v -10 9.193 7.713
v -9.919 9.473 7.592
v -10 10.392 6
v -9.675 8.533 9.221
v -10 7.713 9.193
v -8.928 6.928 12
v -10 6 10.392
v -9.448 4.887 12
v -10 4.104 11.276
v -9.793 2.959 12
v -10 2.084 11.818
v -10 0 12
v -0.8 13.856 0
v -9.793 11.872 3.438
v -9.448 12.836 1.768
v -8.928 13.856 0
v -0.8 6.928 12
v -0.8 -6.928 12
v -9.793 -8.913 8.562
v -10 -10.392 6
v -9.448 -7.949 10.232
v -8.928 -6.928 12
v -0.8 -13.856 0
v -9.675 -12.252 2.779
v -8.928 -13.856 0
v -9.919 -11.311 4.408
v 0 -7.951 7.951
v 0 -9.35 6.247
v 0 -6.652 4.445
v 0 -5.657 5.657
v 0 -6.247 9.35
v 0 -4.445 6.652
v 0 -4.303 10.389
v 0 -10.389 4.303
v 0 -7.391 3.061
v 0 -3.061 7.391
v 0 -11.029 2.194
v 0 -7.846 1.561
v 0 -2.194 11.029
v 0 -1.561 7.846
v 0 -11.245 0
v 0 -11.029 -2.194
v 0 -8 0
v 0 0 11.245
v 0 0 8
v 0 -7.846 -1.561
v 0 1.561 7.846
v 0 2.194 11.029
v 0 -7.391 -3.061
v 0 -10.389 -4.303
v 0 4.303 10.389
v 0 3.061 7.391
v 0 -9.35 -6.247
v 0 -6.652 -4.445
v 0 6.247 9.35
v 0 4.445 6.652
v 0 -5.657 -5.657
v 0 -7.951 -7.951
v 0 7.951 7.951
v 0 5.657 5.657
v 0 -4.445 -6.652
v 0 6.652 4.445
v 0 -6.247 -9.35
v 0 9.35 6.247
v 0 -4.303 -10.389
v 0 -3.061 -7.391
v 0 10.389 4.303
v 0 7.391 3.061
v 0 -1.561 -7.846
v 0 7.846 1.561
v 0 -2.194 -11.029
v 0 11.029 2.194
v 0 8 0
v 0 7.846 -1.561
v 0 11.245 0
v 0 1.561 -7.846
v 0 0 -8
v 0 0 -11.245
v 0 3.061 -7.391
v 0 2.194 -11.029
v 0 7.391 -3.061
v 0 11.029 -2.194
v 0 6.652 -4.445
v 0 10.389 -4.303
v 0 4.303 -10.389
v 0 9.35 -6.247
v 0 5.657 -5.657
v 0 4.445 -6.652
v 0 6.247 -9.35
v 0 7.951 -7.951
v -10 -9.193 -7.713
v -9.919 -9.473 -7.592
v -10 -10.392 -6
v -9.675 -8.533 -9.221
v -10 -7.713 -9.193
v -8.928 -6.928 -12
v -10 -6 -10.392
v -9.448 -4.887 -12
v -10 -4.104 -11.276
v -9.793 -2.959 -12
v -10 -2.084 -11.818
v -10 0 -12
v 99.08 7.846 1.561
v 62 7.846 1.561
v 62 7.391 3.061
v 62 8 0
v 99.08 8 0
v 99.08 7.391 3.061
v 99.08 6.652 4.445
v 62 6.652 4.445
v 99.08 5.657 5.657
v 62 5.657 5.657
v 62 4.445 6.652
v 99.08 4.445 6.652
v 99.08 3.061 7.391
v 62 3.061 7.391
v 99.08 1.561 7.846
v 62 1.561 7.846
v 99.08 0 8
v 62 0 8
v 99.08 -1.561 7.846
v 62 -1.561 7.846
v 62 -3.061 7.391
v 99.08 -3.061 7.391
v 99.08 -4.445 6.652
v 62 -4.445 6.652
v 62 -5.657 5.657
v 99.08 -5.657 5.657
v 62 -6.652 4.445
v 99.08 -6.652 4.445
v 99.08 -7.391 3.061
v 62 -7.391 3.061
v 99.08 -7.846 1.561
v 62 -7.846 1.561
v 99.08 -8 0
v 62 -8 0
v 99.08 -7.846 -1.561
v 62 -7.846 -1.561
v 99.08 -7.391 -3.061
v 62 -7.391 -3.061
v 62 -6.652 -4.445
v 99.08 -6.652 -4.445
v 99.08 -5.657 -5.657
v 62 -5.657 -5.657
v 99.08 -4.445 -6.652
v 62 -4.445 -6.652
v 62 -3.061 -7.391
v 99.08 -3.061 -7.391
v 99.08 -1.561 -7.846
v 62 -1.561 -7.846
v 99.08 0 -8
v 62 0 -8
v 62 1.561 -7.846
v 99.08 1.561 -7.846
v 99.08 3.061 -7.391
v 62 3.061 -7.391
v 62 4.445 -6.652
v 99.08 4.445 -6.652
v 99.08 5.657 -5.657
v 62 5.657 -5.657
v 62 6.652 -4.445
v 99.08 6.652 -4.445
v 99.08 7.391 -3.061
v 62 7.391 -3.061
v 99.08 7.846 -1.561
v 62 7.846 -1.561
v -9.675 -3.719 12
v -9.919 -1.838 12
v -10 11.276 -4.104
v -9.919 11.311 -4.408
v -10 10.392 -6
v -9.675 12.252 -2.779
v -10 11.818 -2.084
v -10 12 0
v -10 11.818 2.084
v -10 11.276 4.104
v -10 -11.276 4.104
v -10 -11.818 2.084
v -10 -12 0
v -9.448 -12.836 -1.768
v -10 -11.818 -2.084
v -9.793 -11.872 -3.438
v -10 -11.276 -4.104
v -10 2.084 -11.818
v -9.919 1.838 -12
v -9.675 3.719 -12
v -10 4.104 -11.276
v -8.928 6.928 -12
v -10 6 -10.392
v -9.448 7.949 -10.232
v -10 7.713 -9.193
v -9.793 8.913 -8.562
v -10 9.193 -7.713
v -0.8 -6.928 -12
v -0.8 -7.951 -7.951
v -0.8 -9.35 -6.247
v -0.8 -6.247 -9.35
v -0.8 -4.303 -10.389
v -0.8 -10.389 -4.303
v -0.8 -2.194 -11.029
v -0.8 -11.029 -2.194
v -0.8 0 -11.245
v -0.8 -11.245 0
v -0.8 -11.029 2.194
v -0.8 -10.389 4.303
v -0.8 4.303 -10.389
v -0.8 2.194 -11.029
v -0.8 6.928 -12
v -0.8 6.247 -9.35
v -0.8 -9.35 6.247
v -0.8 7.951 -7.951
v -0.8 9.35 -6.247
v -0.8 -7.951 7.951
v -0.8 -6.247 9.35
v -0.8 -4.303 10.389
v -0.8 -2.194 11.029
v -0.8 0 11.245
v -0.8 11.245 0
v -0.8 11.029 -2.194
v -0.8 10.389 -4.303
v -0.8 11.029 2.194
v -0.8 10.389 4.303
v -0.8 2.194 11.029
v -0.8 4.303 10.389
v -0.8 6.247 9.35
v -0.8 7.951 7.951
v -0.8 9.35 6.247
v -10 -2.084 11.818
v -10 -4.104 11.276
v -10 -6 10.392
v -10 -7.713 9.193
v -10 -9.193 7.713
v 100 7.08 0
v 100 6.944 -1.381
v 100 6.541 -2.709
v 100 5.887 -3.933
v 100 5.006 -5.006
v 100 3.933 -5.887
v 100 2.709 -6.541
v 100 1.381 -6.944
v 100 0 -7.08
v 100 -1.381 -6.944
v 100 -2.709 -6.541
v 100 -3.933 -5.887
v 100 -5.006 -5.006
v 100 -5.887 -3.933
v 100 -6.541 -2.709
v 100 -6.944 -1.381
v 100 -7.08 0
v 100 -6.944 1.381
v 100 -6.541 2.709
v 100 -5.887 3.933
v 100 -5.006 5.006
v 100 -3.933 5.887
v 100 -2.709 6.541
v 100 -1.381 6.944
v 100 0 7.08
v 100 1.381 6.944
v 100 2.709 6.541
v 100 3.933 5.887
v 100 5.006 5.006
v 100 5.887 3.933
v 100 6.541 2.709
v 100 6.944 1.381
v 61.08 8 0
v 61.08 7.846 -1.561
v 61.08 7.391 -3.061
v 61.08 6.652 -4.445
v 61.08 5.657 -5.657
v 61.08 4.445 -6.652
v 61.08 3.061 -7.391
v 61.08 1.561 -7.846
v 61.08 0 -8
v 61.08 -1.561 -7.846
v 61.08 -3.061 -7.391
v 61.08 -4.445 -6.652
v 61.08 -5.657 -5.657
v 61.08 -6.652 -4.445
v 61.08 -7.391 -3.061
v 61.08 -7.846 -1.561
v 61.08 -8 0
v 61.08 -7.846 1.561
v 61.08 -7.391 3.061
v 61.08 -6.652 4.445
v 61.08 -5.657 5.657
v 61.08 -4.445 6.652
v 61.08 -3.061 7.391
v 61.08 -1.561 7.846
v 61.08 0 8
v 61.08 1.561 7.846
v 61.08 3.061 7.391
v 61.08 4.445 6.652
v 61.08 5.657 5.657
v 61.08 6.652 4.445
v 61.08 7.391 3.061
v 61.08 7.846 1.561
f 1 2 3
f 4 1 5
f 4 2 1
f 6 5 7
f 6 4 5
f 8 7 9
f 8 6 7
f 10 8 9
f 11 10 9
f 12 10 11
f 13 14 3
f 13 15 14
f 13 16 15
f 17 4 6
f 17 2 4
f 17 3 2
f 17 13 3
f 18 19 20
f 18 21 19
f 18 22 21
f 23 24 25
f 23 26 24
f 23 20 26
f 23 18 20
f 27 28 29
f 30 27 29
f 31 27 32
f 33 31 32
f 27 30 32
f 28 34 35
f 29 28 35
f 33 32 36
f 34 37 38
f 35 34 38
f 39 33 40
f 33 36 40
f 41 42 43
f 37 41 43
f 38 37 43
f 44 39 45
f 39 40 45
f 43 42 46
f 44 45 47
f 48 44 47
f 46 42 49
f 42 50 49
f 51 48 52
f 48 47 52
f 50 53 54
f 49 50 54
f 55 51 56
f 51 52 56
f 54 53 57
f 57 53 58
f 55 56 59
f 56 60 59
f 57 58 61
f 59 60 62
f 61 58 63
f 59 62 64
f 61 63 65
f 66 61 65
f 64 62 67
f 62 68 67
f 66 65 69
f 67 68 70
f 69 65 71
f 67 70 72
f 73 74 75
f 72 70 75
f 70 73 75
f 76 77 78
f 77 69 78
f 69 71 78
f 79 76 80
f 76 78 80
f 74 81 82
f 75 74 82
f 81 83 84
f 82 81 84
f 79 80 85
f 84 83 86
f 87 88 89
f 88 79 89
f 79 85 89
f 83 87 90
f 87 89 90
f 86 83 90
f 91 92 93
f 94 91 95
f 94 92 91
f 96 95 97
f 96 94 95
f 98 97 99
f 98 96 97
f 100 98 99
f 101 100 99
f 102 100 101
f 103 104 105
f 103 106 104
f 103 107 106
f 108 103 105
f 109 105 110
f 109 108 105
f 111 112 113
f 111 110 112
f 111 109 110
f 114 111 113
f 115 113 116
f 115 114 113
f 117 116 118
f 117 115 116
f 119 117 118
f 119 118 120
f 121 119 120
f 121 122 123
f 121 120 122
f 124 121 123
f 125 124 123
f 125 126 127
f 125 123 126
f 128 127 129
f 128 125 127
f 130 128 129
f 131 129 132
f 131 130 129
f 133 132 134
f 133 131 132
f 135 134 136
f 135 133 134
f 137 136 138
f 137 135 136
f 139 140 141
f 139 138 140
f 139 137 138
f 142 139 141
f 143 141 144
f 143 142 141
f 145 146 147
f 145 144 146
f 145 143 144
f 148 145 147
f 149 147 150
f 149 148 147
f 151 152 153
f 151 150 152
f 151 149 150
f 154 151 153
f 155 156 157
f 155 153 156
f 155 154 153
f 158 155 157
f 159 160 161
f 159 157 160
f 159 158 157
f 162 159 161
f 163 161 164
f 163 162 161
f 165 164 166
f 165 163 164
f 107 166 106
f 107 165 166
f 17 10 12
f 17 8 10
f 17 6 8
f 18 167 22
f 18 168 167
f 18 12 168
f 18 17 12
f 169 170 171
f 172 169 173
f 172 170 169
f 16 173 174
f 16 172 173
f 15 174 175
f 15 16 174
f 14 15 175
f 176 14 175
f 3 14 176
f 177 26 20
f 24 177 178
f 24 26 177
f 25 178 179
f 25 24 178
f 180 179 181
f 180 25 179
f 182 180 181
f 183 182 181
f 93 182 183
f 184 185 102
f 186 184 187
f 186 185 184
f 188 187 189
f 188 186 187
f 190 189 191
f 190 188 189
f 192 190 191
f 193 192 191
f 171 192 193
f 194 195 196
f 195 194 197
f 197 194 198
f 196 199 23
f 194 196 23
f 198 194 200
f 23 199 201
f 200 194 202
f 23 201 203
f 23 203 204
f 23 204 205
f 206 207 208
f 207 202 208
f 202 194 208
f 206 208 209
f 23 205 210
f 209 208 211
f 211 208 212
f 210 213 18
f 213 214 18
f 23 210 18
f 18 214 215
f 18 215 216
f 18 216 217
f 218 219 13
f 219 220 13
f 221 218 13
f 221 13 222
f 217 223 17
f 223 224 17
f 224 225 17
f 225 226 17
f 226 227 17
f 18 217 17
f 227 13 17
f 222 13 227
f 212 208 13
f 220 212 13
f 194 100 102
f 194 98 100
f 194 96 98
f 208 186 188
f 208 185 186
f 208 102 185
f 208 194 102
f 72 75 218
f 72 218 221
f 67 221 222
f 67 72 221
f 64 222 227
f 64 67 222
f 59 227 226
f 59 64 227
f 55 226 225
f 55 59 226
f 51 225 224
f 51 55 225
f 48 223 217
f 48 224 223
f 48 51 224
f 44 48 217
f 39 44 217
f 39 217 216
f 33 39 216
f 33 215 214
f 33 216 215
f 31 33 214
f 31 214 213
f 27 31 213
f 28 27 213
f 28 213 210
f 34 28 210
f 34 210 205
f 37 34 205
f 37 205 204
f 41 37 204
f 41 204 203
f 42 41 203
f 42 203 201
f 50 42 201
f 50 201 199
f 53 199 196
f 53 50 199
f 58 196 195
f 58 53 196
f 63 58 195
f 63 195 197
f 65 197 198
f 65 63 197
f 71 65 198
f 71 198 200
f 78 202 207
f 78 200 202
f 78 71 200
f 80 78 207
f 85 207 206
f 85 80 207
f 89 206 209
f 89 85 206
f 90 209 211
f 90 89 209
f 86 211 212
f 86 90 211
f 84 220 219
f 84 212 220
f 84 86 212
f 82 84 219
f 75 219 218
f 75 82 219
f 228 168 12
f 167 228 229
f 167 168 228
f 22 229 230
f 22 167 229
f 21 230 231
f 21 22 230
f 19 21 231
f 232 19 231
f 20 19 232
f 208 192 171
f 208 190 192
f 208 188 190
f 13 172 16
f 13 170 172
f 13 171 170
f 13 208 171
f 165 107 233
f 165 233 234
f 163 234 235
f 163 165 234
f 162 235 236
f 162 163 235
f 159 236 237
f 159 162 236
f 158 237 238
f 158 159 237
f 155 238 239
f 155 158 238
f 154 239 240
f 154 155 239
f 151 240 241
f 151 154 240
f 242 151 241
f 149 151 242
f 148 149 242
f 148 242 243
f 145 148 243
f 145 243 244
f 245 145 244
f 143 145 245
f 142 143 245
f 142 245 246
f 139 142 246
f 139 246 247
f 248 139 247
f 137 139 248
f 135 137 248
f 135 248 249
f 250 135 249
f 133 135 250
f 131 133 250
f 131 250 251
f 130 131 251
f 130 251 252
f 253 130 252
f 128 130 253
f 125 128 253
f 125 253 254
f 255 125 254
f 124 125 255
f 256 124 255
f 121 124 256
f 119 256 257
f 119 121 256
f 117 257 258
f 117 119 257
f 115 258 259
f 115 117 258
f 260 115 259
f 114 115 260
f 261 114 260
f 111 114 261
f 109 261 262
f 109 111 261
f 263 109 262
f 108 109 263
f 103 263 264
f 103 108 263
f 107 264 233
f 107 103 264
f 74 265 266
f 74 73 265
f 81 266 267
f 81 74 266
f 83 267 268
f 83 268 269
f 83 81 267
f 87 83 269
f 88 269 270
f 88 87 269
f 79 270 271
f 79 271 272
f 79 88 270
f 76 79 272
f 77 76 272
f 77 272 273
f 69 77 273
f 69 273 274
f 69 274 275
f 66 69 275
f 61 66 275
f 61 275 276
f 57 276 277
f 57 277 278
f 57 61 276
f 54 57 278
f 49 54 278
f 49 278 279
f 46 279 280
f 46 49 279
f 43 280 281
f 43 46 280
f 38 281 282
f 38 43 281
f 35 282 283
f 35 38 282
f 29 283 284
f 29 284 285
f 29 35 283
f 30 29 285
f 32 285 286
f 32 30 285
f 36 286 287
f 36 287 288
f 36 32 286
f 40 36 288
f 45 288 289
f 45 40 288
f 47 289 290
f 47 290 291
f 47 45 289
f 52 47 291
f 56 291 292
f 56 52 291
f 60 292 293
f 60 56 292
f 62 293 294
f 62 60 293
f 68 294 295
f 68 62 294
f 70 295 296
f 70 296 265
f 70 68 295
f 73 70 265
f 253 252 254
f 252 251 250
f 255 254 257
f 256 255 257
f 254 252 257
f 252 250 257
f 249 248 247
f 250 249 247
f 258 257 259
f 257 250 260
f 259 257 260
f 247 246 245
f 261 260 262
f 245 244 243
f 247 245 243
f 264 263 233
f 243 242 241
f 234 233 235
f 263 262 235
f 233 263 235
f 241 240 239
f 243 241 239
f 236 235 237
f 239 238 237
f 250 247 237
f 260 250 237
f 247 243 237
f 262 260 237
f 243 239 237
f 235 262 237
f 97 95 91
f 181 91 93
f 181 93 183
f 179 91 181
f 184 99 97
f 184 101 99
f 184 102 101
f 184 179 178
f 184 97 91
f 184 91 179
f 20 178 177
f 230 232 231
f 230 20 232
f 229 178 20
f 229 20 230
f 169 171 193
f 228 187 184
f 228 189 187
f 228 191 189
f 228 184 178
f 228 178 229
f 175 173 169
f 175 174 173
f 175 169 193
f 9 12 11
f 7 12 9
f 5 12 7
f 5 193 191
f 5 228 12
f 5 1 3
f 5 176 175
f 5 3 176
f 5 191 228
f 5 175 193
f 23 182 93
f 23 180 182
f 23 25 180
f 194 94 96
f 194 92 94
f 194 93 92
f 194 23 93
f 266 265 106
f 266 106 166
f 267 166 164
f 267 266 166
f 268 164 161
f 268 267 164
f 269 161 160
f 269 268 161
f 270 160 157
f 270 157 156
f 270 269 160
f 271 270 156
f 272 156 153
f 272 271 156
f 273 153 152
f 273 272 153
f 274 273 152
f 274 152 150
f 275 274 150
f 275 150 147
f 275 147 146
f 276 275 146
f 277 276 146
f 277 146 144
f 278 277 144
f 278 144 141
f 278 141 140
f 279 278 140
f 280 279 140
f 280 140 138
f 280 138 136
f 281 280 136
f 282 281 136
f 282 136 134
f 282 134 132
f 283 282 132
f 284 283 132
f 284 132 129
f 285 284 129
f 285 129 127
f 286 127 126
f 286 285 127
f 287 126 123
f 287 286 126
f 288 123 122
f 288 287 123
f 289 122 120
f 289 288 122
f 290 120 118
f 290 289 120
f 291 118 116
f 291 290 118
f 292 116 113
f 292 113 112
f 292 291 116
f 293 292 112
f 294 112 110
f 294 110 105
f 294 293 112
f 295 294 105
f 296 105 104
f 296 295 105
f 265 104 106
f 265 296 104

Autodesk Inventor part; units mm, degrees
ref_plane "YZ Plane" through (0, 0, 0) normal (1, 0, 0) x (0, 1, 0)
ref_plane "XZ Plane" through (0, 0, 0) normal (0, 1, 0) x (-1, 0, 0)
sketch "Sketch1" plane through (0, 0, 0) normal (0, 0, 1) x (1, 0, 0)
  line L0 (0, 11.245) -> (0, 8)
  line L1 (62, 8) -> (100, 8)
  line L2 (100, 8) -> (100, 0)
  line L3 (100, 0) -> (-0.8001, 0)
  line L4 (-20.9601, 0) -> (120.16, 0) projected
  line L5 (-0.8001, 0) -> (-0.8001, 11.245)
  line L6 (-0.8001, 11.245) -> (0, 11.245)
  line L7 (62, 8) -> (61.0797, 8)
  line L8 (61.0797, 8) -> (0, 8)
  line L9 (0, -2.249) -> (0, 13.494) projected
  dimension "d0" = 100
  dimension "d1" = 38
  dimension "d2" = 16
  dimension "d9" = 0.8001
  dimension "d10" = 22.49
  dimension "d13" = 0.9203
  dimension "d14" = 16
revolve "Body" add sketch "Sketch1" angle 360 about axis through (100, 0, 0) along (-1, 0, 0)
sketch "Sketch2" plane through (-0.8001, 0, 0) normal (-1, 0, 0) x (0, 0, 1)
  line L0 (0, 13.8564) -> (12, 6.9282)
  line L1 (12, 6.9282) -> (12, -6.9282)
  line L2 (12, -6.9282) -> (0, -13.8564)
  line L3 (0, -13.8564) -> (-12, -6.9282)
  line L4 (-12, -6.9282) -> (-12, 6.9282)
  line L5 (-12, 6.9282) -> (0, 13.8564)
  point P0 (0, 0)
  point P1 (0, 0)
  dimension "d11" = 24
extrude "Head" add sketch "Sketch2" along normal blind 9.2
sketch "Sketch4" plane through (0, 0, 0) normal (0, 0, 1) x (1, 0, 0)
  line L0 (-10.0001, 12) -> (-10.0001, 13.8564)
  line L1 (-10.0001, 13.8564) -> (-8.9283, 13.8564)
  line L2 (-8.9283, 13.8564) -> (-10.0001, 12)
  line L3 (-11.8401, 0) -> (1.0399, 0) projected
  line L4 (-0.8001, 13.8564) -> (-10.0001, 13.8564) projected
  line L5 (-10.0001, 6.9282) -> (-10.0001, 13.8564) projected
  dimension "d5" = 30
  dimension "d19" = 24
revolve "Chamfer1" cut sketch "Sketch4" angle 360 about axis through (-10, 0, 0) along (1, 0, 0)
thread "Thread" size "M16x1.5" class "6g" standard "ISO Metric profile" length 38
chamfer "Chamfer2" distance 0.9202 distance2 0.9203 1 edges at (100, -8, 0) measured on face at (100, -0.9456, 1.8959)
ref_plane "Work Plane1" through (1.525, 0, 0) normal (0, 0, 1) x (1, 0, 0)
equation "\"d0\" = NLG"
equation "\"d1\" = GEL"
equation "\"d2\" = GD"
equation "\"d10\" = SD2"
equation "\"d14\" = BDM"
equation "\"d11\" = SW"
equation "\"d3\" = KOH - SD"
equation "\"d5\" = ANG1"
equation "\"d19\" = SW0"
equation "\"d15\" = GEL"
equation "\"d6\" = -0.5 * SPD + 0.5 * GD"
equation "\"NLG\" = 100"
equation "\"GD\" = NND"
equation "\"BDM\" = NND"
equation "\"KOH\" = 10"
equation "\"GEL\" = 38"
equation "\"SW\" = 24"
equation "\"SW0\" = SW"
equation "\"SPD\" = NND - 1.2269 * PTC"
equation "\"SD2\" = 22.49"
equation "\"SD\" = 0.8"
equation "\"ANG1\" = 30deg"
equation "\"GAL\" = 0.61345 * PTC"
equation "\"GUL\" = 0.61345 * PTC"
equation "\"RR\" = 0.6"
equation "\"GD1\" = THREADDIA - 1.2269 * PTC"
equation "\"THREADDIA\" = 16"
equation "\"SDH\" = SD2"
equation "\"TOA\" = 30deg"
equation "\"PTC\" = 1.5"
equation "\"NND\" = 16"
equation "\"E0\" = 1.155 * SW"
properties part number "ISO 8765 - M16 x 1.5 x 100" material "Stainless Steel, 440C"
